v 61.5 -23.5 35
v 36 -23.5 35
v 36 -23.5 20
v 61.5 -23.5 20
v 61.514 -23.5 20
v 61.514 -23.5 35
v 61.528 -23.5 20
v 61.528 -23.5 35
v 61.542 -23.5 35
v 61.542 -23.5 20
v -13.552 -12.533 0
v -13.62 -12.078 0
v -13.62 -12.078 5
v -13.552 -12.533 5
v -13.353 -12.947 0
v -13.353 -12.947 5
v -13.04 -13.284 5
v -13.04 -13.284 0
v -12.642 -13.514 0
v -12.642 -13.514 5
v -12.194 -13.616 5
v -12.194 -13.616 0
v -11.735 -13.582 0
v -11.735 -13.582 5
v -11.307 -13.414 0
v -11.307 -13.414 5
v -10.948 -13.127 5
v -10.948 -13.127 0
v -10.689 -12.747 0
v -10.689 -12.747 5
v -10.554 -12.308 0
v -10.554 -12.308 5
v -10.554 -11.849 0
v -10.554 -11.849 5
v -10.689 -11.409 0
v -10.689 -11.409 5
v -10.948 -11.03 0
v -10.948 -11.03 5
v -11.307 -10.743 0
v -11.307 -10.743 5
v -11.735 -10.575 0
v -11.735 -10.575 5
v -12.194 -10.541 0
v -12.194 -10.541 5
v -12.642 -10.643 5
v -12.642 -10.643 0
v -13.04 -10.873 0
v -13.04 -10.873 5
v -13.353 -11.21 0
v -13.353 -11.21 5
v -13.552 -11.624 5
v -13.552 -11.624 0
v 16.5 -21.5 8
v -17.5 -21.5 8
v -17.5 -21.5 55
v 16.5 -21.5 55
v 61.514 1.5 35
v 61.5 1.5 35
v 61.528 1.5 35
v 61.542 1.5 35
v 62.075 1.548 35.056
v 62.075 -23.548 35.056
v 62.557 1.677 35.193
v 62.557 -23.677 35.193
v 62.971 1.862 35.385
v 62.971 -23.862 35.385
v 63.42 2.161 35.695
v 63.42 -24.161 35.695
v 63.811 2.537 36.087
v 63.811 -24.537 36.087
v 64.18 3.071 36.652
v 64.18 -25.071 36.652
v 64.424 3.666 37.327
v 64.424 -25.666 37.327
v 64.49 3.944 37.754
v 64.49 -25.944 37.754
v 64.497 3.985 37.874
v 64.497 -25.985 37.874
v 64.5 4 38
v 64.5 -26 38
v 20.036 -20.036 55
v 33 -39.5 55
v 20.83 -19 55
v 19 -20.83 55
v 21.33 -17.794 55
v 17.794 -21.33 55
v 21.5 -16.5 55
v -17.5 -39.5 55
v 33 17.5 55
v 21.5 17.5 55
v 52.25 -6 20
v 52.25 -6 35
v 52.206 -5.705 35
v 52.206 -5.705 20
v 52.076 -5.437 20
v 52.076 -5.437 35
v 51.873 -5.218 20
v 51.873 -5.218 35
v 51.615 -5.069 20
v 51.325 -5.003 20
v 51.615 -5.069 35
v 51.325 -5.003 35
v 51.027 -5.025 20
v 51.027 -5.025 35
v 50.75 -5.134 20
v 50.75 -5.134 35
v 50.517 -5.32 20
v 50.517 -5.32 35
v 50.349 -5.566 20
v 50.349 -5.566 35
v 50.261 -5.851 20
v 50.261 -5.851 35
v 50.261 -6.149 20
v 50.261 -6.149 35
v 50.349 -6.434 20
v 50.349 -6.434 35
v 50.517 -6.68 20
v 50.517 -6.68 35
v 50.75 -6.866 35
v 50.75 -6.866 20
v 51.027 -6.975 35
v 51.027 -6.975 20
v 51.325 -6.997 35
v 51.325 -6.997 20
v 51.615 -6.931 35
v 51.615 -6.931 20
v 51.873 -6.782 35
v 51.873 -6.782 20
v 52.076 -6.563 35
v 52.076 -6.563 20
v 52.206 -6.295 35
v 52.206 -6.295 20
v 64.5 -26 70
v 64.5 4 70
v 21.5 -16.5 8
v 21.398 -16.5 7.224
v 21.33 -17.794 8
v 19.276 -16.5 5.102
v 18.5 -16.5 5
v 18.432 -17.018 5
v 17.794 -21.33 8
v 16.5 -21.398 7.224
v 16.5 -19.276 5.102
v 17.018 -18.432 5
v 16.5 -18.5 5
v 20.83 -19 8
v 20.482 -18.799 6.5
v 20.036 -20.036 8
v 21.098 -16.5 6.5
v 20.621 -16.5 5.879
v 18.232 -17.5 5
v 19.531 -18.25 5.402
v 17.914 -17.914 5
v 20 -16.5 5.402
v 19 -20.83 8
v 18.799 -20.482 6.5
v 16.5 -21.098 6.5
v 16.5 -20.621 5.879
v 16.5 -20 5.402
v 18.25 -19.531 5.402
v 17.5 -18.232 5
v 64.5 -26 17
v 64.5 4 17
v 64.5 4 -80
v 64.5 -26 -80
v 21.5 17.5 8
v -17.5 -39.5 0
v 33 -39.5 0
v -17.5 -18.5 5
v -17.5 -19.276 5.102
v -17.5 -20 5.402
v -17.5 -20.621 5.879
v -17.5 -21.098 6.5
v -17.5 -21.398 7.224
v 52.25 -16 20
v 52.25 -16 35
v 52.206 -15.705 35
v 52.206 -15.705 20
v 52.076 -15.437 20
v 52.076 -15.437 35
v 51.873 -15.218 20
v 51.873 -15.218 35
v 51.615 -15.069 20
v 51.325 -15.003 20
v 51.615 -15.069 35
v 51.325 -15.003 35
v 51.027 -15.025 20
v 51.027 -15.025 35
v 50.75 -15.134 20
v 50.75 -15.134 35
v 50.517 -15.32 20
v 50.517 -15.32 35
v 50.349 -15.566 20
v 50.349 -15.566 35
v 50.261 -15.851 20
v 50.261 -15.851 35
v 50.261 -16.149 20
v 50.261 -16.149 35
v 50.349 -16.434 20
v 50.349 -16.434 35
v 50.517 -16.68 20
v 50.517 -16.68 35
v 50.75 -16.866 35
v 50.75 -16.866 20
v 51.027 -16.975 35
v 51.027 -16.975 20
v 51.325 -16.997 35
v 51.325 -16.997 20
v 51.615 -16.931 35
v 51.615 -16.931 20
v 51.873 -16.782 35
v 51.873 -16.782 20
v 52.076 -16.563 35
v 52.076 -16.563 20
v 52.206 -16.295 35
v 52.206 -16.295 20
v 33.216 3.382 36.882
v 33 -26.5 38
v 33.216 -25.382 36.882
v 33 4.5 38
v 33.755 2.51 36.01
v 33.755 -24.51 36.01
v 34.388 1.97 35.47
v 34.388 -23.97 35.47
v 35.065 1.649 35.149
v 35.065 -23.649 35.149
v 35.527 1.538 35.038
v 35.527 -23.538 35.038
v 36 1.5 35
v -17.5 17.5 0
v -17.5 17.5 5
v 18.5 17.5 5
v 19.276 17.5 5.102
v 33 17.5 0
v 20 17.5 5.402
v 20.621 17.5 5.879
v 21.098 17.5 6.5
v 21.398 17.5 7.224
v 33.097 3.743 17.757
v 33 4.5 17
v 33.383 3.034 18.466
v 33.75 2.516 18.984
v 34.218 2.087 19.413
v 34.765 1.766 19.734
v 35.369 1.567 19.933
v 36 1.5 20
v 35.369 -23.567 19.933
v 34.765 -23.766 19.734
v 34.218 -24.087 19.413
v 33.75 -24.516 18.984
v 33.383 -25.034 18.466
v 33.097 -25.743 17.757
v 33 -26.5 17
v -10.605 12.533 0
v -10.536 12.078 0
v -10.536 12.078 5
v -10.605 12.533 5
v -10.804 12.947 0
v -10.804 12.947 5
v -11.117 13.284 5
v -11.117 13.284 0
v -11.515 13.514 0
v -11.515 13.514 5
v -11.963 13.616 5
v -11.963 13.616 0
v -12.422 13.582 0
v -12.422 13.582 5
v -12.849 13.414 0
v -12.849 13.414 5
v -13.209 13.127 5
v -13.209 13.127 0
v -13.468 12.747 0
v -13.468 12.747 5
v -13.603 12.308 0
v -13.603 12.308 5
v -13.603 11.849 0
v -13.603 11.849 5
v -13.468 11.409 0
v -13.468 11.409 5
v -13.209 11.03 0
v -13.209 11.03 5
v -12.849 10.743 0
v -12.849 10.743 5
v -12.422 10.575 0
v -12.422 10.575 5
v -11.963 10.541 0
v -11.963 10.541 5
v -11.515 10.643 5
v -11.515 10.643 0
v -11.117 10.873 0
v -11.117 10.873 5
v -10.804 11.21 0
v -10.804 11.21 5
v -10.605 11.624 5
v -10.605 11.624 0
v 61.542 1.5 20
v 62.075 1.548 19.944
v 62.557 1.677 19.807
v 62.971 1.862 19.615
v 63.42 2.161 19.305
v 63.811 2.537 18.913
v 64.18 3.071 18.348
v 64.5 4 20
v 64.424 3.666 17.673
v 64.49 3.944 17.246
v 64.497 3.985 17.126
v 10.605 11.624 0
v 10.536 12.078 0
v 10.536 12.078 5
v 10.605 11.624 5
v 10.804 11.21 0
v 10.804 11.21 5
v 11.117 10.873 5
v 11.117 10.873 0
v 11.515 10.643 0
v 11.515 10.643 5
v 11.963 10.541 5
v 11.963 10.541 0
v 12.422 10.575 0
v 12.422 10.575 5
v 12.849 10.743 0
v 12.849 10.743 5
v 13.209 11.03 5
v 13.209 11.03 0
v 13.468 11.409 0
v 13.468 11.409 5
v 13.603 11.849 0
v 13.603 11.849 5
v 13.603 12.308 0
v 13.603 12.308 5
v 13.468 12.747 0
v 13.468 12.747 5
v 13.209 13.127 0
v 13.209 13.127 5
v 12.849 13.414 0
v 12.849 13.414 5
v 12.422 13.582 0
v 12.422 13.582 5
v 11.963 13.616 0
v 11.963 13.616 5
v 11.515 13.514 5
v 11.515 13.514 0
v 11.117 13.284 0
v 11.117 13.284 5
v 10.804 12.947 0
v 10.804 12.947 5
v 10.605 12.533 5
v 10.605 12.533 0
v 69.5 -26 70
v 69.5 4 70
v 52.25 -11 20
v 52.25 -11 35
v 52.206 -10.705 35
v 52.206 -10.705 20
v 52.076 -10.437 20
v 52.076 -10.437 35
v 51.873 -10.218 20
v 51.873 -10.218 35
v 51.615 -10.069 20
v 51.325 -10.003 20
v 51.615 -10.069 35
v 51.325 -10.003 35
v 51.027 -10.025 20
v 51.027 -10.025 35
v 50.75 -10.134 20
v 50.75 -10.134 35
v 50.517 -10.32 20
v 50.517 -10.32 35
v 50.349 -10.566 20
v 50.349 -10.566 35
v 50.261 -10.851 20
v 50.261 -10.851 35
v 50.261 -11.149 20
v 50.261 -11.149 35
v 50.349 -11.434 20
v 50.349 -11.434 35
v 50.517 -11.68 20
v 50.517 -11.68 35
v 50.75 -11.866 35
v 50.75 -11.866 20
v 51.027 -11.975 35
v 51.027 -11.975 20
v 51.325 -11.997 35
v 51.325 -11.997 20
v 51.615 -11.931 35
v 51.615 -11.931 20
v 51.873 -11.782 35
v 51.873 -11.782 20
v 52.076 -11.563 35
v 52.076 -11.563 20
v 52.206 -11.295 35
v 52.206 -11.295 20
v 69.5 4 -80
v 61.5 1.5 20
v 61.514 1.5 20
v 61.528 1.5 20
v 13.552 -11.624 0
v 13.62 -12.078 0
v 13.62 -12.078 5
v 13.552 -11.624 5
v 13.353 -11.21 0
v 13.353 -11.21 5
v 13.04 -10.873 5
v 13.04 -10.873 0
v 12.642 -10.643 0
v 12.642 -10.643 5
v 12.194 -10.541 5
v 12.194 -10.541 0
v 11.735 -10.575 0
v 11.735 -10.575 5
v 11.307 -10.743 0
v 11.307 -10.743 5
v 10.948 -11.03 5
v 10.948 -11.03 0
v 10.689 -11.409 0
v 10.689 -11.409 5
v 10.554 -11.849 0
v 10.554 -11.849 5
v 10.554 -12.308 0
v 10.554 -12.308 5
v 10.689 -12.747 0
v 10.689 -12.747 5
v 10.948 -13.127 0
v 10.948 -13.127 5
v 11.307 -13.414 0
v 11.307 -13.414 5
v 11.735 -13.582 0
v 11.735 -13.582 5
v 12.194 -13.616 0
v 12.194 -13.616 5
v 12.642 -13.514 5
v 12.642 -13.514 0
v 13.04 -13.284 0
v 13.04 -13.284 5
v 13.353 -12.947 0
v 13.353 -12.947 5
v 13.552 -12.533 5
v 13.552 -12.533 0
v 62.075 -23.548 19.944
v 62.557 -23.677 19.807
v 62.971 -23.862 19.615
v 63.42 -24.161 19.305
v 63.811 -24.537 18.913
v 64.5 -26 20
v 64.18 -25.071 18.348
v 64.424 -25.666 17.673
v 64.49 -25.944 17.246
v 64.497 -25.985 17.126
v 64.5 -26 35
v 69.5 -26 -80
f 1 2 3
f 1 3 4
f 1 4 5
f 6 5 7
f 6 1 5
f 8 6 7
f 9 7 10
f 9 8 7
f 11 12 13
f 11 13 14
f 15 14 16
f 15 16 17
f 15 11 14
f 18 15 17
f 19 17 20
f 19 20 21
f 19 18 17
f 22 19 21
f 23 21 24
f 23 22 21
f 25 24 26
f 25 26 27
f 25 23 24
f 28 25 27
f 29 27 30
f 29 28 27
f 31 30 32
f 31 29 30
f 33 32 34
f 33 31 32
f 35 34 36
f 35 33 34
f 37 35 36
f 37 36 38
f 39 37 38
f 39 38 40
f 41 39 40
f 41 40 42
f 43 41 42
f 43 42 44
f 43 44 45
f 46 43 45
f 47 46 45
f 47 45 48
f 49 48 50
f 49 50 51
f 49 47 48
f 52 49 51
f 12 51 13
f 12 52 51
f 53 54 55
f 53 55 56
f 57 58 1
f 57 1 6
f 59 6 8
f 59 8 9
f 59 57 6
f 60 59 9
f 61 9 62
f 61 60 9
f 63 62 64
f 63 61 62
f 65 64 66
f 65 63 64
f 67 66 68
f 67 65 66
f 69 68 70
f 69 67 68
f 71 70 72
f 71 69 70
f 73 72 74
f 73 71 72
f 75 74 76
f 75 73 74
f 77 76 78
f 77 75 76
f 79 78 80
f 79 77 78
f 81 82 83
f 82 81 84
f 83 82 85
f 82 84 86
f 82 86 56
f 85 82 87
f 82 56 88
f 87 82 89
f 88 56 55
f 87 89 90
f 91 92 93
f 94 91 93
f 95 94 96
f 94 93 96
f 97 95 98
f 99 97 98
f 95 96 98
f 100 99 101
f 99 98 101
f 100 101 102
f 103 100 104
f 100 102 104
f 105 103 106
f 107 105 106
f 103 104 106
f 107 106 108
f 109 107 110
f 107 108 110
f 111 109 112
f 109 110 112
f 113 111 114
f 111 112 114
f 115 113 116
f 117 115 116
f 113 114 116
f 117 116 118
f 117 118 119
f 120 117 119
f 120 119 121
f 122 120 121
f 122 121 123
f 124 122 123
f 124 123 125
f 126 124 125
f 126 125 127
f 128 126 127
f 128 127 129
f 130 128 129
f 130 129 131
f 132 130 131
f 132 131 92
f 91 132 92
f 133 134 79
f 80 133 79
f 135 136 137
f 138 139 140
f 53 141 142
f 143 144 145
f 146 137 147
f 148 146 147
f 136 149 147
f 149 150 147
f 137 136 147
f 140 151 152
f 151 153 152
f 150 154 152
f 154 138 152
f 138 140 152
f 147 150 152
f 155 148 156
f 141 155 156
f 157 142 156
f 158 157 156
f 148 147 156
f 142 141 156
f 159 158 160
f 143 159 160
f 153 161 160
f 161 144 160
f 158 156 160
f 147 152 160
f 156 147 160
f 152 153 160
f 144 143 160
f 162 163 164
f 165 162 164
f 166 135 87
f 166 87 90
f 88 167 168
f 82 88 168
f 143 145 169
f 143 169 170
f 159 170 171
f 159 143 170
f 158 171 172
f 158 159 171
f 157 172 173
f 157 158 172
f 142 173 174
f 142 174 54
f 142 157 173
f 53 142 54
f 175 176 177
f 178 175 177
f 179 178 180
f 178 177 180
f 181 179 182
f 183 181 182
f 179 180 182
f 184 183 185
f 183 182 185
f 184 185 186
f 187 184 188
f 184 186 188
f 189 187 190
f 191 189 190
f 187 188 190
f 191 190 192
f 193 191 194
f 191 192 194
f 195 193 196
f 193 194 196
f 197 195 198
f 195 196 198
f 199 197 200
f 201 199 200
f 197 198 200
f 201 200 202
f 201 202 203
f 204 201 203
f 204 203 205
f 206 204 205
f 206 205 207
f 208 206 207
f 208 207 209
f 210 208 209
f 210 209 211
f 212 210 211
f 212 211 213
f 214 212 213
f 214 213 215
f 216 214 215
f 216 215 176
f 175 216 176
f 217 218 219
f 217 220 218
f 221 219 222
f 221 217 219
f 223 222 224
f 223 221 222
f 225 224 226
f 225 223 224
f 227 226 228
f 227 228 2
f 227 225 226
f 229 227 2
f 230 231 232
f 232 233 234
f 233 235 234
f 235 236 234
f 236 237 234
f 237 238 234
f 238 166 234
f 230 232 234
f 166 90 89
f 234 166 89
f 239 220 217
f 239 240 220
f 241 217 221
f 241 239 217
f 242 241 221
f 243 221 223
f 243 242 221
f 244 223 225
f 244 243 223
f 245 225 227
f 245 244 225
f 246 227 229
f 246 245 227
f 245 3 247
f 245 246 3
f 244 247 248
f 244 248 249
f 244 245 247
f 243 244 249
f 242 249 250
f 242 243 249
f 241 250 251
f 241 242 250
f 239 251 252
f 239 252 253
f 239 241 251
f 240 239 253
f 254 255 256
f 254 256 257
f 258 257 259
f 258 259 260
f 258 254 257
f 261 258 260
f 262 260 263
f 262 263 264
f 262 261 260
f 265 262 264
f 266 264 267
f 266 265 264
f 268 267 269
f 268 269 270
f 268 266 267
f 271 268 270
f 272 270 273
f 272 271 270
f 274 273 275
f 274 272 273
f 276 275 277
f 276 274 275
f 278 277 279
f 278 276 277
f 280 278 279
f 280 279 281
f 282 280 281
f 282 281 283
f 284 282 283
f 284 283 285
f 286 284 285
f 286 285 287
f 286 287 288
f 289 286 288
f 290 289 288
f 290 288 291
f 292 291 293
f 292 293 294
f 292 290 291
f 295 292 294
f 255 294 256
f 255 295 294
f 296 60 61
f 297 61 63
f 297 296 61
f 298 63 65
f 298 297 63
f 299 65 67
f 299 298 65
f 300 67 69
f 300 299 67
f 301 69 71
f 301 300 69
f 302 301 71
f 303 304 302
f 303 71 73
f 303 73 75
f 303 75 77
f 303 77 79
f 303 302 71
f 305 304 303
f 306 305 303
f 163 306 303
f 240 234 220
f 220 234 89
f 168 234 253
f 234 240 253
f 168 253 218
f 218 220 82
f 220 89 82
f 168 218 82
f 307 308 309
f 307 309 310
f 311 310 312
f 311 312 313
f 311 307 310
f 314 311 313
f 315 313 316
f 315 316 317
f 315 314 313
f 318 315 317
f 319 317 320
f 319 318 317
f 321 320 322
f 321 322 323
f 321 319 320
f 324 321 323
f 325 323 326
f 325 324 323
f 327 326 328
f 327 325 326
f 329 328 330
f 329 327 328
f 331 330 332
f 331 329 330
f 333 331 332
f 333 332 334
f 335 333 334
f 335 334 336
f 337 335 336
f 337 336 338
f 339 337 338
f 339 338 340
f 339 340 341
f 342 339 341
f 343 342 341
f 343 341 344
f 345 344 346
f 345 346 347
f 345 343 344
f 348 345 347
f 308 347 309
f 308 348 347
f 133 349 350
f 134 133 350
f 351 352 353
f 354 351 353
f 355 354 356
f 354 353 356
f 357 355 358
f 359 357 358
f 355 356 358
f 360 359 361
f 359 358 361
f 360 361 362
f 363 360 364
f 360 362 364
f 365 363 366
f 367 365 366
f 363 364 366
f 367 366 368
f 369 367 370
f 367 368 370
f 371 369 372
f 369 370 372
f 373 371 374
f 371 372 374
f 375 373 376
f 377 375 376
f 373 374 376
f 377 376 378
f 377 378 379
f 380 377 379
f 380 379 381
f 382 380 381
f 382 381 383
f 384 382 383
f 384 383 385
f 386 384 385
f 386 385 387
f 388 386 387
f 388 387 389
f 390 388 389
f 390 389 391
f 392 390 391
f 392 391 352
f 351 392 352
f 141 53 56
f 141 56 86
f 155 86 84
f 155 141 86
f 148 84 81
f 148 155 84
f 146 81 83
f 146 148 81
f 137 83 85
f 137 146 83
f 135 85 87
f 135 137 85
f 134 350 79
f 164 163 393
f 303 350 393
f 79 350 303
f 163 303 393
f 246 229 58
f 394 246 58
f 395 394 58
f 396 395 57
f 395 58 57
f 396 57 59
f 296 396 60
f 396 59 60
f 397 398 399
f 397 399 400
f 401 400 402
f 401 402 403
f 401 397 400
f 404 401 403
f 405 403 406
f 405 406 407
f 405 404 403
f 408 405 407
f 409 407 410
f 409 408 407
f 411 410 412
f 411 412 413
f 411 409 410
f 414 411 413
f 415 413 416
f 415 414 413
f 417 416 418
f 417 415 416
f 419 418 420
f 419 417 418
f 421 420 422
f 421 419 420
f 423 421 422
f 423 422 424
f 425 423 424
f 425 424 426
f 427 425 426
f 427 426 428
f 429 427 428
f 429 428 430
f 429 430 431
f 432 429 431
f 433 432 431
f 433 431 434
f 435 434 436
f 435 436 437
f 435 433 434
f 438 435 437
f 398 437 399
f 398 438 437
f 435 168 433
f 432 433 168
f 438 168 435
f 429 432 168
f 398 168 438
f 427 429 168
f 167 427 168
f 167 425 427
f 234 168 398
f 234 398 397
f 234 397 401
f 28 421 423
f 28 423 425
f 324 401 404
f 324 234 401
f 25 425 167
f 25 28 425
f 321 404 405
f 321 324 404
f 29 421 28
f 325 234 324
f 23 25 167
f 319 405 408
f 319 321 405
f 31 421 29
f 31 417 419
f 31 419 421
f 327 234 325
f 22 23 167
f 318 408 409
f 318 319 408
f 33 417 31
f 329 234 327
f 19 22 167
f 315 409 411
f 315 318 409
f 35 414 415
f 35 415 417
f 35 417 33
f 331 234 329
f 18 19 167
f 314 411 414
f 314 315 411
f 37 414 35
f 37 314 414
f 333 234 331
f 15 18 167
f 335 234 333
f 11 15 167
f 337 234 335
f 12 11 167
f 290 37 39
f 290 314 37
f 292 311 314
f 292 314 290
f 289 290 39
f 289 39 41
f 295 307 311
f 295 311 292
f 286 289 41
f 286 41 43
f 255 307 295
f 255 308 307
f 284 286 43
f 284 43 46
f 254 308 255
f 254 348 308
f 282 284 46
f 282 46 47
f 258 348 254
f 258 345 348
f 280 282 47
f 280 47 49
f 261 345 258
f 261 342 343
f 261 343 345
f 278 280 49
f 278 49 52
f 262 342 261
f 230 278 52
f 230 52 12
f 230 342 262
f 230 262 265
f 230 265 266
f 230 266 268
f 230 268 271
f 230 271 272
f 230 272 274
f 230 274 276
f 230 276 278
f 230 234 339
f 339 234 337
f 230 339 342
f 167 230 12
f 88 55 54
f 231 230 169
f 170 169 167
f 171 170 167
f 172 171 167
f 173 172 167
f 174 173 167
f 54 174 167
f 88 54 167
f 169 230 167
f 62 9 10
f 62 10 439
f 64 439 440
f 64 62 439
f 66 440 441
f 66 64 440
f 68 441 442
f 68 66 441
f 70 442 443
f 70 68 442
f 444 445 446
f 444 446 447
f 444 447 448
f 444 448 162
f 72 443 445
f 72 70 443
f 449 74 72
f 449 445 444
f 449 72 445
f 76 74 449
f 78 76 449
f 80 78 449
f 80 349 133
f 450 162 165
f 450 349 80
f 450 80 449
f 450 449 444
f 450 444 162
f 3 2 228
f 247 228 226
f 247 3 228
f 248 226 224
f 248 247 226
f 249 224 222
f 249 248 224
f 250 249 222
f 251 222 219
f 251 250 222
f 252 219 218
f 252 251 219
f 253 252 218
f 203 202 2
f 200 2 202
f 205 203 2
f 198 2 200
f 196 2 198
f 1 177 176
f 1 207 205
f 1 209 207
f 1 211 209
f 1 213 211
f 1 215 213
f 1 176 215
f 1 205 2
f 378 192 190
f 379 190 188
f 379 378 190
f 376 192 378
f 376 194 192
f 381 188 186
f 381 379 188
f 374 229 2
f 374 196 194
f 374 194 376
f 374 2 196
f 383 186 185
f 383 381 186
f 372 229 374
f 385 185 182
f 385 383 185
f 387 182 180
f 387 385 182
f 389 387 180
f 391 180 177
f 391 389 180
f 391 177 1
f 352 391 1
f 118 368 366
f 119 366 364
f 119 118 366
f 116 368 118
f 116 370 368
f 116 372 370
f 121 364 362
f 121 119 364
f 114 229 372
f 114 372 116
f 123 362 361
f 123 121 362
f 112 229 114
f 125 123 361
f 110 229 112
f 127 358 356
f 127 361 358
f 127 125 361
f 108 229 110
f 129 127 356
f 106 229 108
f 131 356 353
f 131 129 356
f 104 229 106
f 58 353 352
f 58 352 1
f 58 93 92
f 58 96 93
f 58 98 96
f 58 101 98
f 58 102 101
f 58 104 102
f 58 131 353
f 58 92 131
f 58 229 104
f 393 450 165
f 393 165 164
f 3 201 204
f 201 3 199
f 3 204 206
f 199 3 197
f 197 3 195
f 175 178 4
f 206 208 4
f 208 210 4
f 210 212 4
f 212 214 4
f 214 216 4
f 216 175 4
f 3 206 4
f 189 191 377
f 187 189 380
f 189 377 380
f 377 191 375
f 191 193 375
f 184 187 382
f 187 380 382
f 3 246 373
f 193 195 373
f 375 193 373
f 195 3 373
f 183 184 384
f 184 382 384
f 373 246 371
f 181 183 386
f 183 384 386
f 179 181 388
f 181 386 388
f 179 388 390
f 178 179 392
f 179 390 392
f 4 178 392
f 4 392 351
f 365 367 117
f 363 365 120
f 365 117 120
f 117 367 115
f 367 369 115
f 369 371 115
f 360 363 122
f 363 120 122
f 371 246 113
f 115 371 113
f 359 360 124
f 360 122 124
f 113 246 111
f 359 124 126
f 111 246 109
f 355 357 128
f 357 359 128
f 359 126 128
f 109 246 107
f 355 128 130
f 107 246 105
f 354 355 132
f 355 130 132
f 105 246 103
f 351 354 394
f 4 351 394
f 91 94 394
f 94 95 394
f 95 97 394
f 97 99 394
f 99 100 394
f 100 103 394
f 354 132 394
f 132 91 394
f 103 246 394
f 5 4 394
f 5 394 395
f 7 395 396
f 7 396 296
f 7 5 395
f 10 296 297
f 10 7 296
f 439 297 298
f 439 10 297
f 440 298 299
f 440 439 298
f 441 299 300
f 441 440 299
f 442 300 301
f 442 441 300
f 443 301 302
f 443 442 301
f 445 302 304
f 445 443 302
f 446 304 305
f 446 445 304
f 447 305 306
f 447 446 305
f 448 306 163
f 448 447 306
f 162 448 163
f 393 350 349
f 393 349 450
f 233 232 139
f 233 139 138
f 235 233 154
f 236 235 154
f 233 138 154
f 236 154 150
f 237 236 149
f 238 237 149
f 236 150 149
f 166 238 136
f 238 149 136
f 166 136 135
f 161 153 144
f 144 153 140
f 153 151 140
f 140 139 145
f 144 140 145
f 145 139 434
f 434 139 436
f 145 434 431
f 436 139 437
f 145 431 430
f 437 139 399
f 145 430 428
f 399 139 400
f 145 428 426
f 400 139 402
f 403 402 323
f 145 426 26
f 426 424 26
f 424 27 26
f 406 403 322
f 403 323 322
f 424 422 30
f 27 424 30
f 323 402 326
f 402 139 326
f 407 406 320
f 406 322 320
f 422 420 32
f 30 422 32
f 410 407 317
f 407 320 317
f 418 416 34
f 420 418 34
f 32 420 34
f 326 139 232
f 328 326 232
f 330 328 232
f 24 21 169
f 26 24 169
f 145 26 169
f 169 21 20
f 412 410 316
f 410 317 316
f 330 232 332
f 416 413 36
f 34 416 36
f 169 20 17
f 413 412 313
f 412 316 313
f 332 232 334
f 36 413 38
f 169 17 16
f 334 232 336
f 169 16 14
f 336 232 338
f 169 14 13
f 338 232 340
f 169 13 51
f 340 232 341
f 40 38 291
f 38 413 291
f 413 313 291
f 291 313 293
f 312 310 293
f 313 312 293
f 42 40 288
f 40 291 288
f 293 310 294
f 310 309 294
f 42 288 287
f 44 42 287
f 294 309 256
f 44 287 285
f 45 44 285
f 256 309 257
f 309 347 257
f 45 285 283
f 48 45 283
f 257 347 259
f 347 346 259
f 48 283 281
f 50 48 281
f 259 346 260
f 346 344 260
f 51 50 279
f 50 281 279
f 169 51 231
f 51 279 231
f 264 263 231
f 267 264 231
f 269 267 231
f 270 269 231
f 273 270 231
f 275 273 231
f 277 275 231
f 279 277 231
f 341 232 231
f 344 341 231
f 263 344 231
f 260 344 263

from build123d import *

# Parameters (mm, degrees)
SKETCH1_R                = 1.542
BOSS_EXTRUDE1_DEPTH      = 5
BOSS_EXTRUDE4_DEPTH      = 50
BOSS_EXTRUDE4_DEPTH_BACK = 5
FILLET3_R                = 3
FILLET4_R                = 5
BOSS_EXTRUDE5_DEPTH      = 55
SKETCH7_W                = 15
SKETCH7_H                = 25
BOSS_EXTRUDE6_DEPTH      = 36.5
SKETCH8_R                = 1
CUT_EXTRUDE1_DEPTH       = 88.266832187
SKETCH9_W                = 150
SKETCH9_H                = 30
BOSS_EXTRUDE7_DEPTH      = 5
FILLET5_R                = 3
FILLET6_R                = 3


with BuildPart() as part:
    # Sketch1 → Boss-Extrude1 (new body)
    with BuildSketch(Plane.XY):
        Polygon((-17.5, 17.5), (17.5, 17.5), (21.5, 17.5), (21.5, -21.5), (17.5, -21.5), (-17.5, -21.5), (-17.5, -17.5), align=None)
        with Locations((-12.078444483, 12.078444483)):
            Circle(SKETCH1_R, mode=Mode.SUBTRACT)
        with Locations(Location((12.078444483, 12.078444483, 0), (0, 0, 180))):
            Circle(SKETCH1_R, mode=Mode.SUBTRACT)
        with Locations((12.078444483, -12.078444483)):
            Circle(SKETCH1_R, mode=Mode.SUBTRACT)
        with Locations(Location((-12.078444483, -12.078444483, 0), (0, 0, 180))):
            Circle(SKETCH1_R, mode=Mode.SUBTRACT)
    extrude(amount=BOSS_EXTRUDE1_DEPTH)

    # Sketch4 → Boss-Extrude4 (add, two sides: drawn at the far end of the back side and taken through both)
    with BuildSketch(Plane.XY.offset(5).offset(-BOSS_EXTRUDE4_DEPTH_BACK)):
        Polygon((21.5, 17.5), (26, 17.5), (26, -26), (-17.5, -26), (-17.5, -21.5), (21.5, -21.5), align=None)
    extrude(amount=BOSS_EXTRUDE4_DEPTH + BOSS_EXTRUDE4_DEPTH_BACK)

    # Fillet3
    fillet3_edges = [part.edges().sort_by_distance(p)[0] for p in [
        (2, -21.5, 5),
        (21.5, -2, 5),
    ]]
    fillet(fillet3_edges, radius=FILLET3_R)

    # Fillet4
    # the kernel refuses this fillet: 5 mm, written as the material it adds along each edge
    with BuildSketch(Plane(origin=(16.5, -16.5, 5), x_dir=(1, 0, 0), z_dir=(0, 1, 0))) as fillet4_piece_1:
        with BuildLine():
            CenterArc((2, -3), 3, 0, 90)
            Line((5, -3), (5, 0))
            Line((5, 0), (2, 0))
        make_face()
    revolve(axis=Axis((16.5, -16.5, 5), (0, 0, -1)), revolution_arc=90)
    with BuildSketch(Plane(origin=(21.5, -21.5, 5), x_dir=(0, 1, 0), z_dir=(0, 0, 1))) as fillet4_piece_2:
        with BuildLine():
            CenterArc((FILLET4_R, FILLET4_R), FILLET4_R, 180, 90)
            Line((0, FILLET4_R), (0, 0))
            Line((0, 0), (FILLET4_R, 0))
        make_face()
    extrude(amount=50)

    # Sketch6 → Boss-Extrude5 (add, through all)
    with BuildSketch(Plane.XY.offset(55)):
        Polygon((-17.5, -26), (26, -26), (26, 17.5), (33, 17.5), (33, -39.5), (26, -39.5), (-17.5, -39.5), align=None)
    extrude(amount=-BOSS_EXTRUDE5_DEPTH)

    # Sketch7 → Boss-Extrude6 (add)
    with BuildSketch(Plane(origin=(33, 0, 0), x_dir=(0, 0, -1), z_dir=(1, 0, 0))):
        with Locations((-27.5, -11)):
            Rectangle(SKETCH7_W, SKETCH7_H)
    extrude(amount=BOSS_EXTRUDE6_DEPTH)

    # Sketch8 → Cut-Extrude1 (cut, through all)
    with BuildSketch(Plane.XY.offset(35)):
        with Locations((51.25, -11)):
            Circle(SKETCH8_R)
        with Locations((51.25, -16)):
            Circle(SKETCH8_R)
        with Locations((51.25, -6)):
            Circle(SKETCH8_R)
    extrude(amount=-CUT_EXTRUDE1_DEPTH, mode=Mode.SUBTRACT)

    # Sketch9 → Boss-Extrude7 (add)
    with BuildSketch(Plane(origin=(69.5, 0, 0), x_dir=(0, 0, -1), z_dir=(1, 0, 0))):
        with Locations((5, -11)):
            Rectangle(SKETCH9_W, SKETCH9_H)
    extrude(amount=-BOSS_EXTRUDE7_DEPTH)

    # Fillet5
    # the kernel refuses this fillet: 3 mm, written as the material it adds along each edge
    with BuildSketch(Plane(origin=(64.5, -23.5, 35), x_dir=(-1, 0, 0), z_dir=(0, 0, -1)), Plane(origin=(64.5, 1.5, 20), x_dir=(-1, 0, 0), z_dir=(0, 0, 1))) as fillet5_piece_1:
        with BuildLine():
            CenterArc((2.958039892, -3), FILLET5_R, 90, 80.405931773)
            Line((0, -2.5), (-0.059160798, -2.49))
            ThreePointArc((-0.059160798, -2.49), (-0.06, -1.25), (-0.06, 0))
            Line((-0.06, 0), (0, 0.06))
            Line((0, 0.06), (2.958039892, 0.06))
            Line((2.958039892, 0.06), (2.958039892, 0))
        make_face()
    extrude(amount=15)
    with BuildSketch(Plane(origin=(64.5, -23.5, 20), x_dir=(-1, 0, 0), z_dir=(0, 1, 0)), Plane(origin=(64.5, 1.5, 35), x_dir=(-1, 0, 0), z_dir=(0, -1, 0))) as fillet5_piece_2:
        with BuildLine():
            CenterArc((FILLET5_R, -FILLET5_R), FILLET5_R, 90, 90)
            Line((0, -FILLET5_R), (-FILLET5_R * 0.02, -FILLET5_R))
            Line((-FILLET5_R * 0.02, -FILLET5_R), (-FILLET5_R * 0.02, FILLET5_R * 0.02))
            Line((-FILLET5_R * 0.02, FILLET5_R * 0.02), (FILLET5_R, FILLET5_R * 0.02))
            Line((FILLET5_R, FILLET5_R * 0.02), (FILLET5_R, 0))
        make_face()
    extrude(amount=25)
    with BuildSketch(Plane(origin=(64.5, -23.5, 42.395099729), x_dir=(-1, 0, 0), z_dir=(0, 0, -1))) as fillet5_piece_3a_section:
        with BuildLine():
            CenterArc((2.958039892, -3), FILLET5_R, 90, 80.405931773)
            Line((0, -2.5), (-0.059160798, -2.49))
            ThreePointArc((-0.059160798, -2.49), (-0.06, -1.25), (-0.06, 0))
            Line((-0.06, 0), (0, 0.06))
            Line((0, 0.06), (2.958039892, 0.06))
            Line((2.958039892, 0.06), (2.958039892, 0))
        make_face()
    fillet5_piece_3a = extrude(amount=22.395099729, mode=Mode.PRIVATE)
    fillet5_piece_3a = split(fillet5_piece_3a, bisect_by=Plane(origin=(63.81401797, -24.116958935, 35), z_dir=(0, 0, 1)), keep=Keep.TOP, mode=Mode.PRIVATE)
    with BuildSketch(Plane(origin=(64.5, 1.5, 35), x_dir=(-1, 0, 0), z_dir=(0, -1, 0))) as fillet5_piece_3b_section:
        with BuildLine():
            CenterArc((FILLET5_R, -FILLET5_R), FILLET5_R, 90, 90)
            Line((0, -FILLET5_R), (-FILLET5_R * 0.02, -FILLET5_R))
            Line((-FILLET5_R * 0.02, -FILLET5_R), (-FILLET5_R * 0.02, FILLET5_R * 0.02))
            Line((-FILLET5_R * 0.02, FILLET5_R * 0.02), (FILLET5_R, FILLET5_R * 0.02))
            Line((FILLET5_R, FILLET5_R * 0.02), (FILLET5_R, 0))
        make_face()
    fillet5_piece_3b = extrude(amount=32.5, mode=Mode.PRIVATE)
    fillet5_piece_3b = split(fillet5_piece_3b, bisect_by=Plane(origin=(63.820814657, -23.5, 35.679185343), z_dir=(0, -1, 0)), keep=Keep.TOP, mode=Mode.PRIVATE)
    fillet5_piece_3b = split(fillet5_piece_3b, bisect_by=Plane(origin=(63.820814657, -26, 35.679185343), z_dir=(0, 1, 0)), keep=Keep.TOP, mode=Mode.PRIVATE)
    fillet5_piece_3 = fillet5_piece_3a & fillet5_piece_3b
    add(fillet5_piece_3)
    with BuildSketch(Plane(origin=(64.5, -31, 20), x_dir=(-1, 0, 0), z_dir=(0, 1, 0))) as fillet5_piece_4a_section:
        with BuildLine():
            CenterArc((FILLET5_R, -FILLET5_R), FILLET5_R, 90, 90)
            Line((0, -FILLET5_R), (-FILLET5_R * 0.02, -FILLET5_R))
            Line((-FILLET5_R * 0.02, -FILLET5_R), (-FILLET5_R * 0.02, FILLET5_R * 0.02))
            Line((-FILLET5_R * 0.02, FILLET5_R * 0.02), (FILLET5_R, FILLET5_R * 0.02))
            Line((FILLET5_R, FILLET5_R * 0.02), (FILLET5_R, 0))
        make_face()
    fillet5_piece_4a = extrude(amount=32.5, mode=Mode.PRIVATE)
    fillet5_piece_4a = split(fillet5_piece_4a, bisect_by=Plane(origin=(63.820814657, -23.5, 19.320814657), z_dir=(0, -1, 0)), keep=Keep.TOP, mode=Mode.PRIVATE)
    fillet5_piece_4a = split(fillet5_piece_4a, bisect_by=Plane(origin=(63.820814657, -26, 19.320814657), z_dir=(0, 1, 0)), keep=Keep.TOP, mode=Mode.PRIVATE)
    with BuildSketch(Plane(origin=(64.5, -23.5, 35), x_dir=(-1, 0, 0), z_dir=(0, 0, -1))) as fillet5_piece_4b_section:
        with BuildLine():
            CenterArc((2.958039892, -3), FILLET5_R, 90, 80.405931773)
            Line((0, -2.5), (-0.059160798, -2.49))
            ThreePointArc((-0.059160798, -2.49), (-0.06, -1.25), (-0.06, 0))
            Line((-0.06, 0), (0, 0.06))
            Line((0, 0.06), (2.958039892, 0.06))
            Line((2.958039892, 0.06), (2.958039892, 0))
        make_face()
    fillet5_piece_4b = extrude(amount=22.395099729, mode=Mode.PRIVATE)
    fillet5_piece_4b = split(fillet5_piece_4b, bisect_by=Plane(origin=(63.81401797, -24.116958935, 20), z_dir=(0, 0, -1)), keep=Keep.TOP, mode=Mode.PRIVATE)
    fillet5_piece_4 = fillet5_piece_4a & fillet5_piece_4b
    add(fillet5_piece_4)
    with BuildSketch(Plane(origin=(64.5, 1.5, 12.604900271), x_dir=(-1, 0, 0), z_dir=(0, 0, 1))) as fillet5_piece_5a_section:
        with BuildLine():
            CenterArc((2.958039892, -3), FILLET5_R, 90, 80.405931773)
            Line((0, -2.5), (-0.059160798, -2.49))
            ThreePointArc((-0.059160798, -2.49), (-0.06, -1.25), (-0.06, 0))
            Line((-0.06, 0), (0, 0.06))
            Line((0, 0.06), (2.958039892, 0.06))
            Line((2.958039892, 0.06), (2.958039892, 0))
        make_face()
    fillet5_piece_5a = extrude(amount=22.395099729, mode=Mode.PRIVATE)
    fillet5_piece_5a = split(fillet5_piece_5a, bisect_by=Plane(origin=(63.81401797, 2.116958935, 20), z_dir=(0, 0, -1)), keep=Keep.TOP, mode=Mode.PRIVATE)
    with BuildSketch(Plane(origin=(64.5, -23.5, 20), x_dir=(-1, 0, 0), z_dir=(0, 1, 0))) as fillet5_piece_5b_section:
        with BuildLine():
            CenterArc((FILLET5_R, -FILLET5_R), FILLET5_R, 90, 90)
            Line((0, -FILLET5_R), (-FILLET5_R * 0.02, -FILLET5_R))
            Line((-FILLET5_R * 0.02, -FILLET5_R), (-FILLET5_R * 0.02, FILLET5_R * 0.02))
            Line((-FILLET5_R * 0.02, FILLET5_R * 0.02), (FILLET5_R, FILLET5_R * 0.02))
            Line((FILLET5_R, FILLET5_R * 0.02), (FILLET5_R, 0))
        make_face()
    fillet5_piece_5b = extrude(amount=32.5, mode=Mode.PRIVATE)
    fillet5_piece_5b = split(fillet5_piece_5b, bisect_by=Plane(origin=(63.820814657, 1.5, 19.320814657), z_dir=(0, 1, 0)), keep=Keep.TOP, mode=Mode.PRIVATE)
    fillet5_piece_5b = split(fillet5_piece_5b, bisect_by=Plane(origin=(63.820814657, 4, 19.320814657), z_dir=(0, -1, 0)), keep=Keep.TOP, mode=Mode.PRIVATE)
    fillet5_piece_5 = fillet5_piece_5a & fillet5_piece_5b
    add(fillet5_piece_5)
    with BuildSketch(Plane(origin=(64.5, 1.5, 20), x_dir=(-1, 0, 0), z_dir=(0, 0, 1))) as fillet5_piece_6a_section:
        with BuildLine():
            CenterArc((2.958039892, -3), FILLET5_R, 90, 80.405931773)
            Line((0, -2.5), (-0.059160798, -2.49))
            ThreePointArc((-0.059160798, -2.49), (-0.06, -1.25), (-0.06, 0))
            Line((-0.06, 0), (0, 0.06))
            Line((0, 0.06), (2.958039892, 0.06))
            Line((2.958039892, 0.06), (2.958039892, 0))
        make_face()
    fillet5_piece_6a = extrude(amount=22.395099729, mode=Mode.PRIVATE)
    fillet5_piece_6a = split(fillet5_piece_6a, bisect_by=Plane(origin=(63.81401797, 2.116958935, 35), z_dir=(0, 0, 1)), keep=Keep.TOP, mode=Mode.PRIVATE)
    with BuildSketch(Plane(origin=(64.5, 9, 35), x_dir=(-1, 0, 0), z_dir=(0, -1, 0))) as fillet5_piece_6b_section:
        with BuildLine():
            CenterArc((FILLET5_R, -FILLET5_R), FILLET5_R, 90, 90)
            Line((0, -FILLET5_R), (-FILLET5_R * 0.02, -FILLET5_R))
            Line((-FILLET5_R * 0.02, -FILLET5_R), (-FILLET5_R * 0.02, FILLET5_R * 0.02))
            Line((-FILLET5_R * 0.02, FILLET5_R * 0.02), (FILLET5_R, FILLET5_R * 0.02))
            Line((FILLET5_R, FILLET5_R * 0.02), (FILLET5_R, 0))
        make_face()
    fillet5_piece_6b = extrude(amount=32.5, mode=Mode.PRIVATE)
    fillet5_piece_6b = split(fillet5_piece_6b, bisect_by=Plane(origin=(63.820814657, 1.5, 35.679185343), z_dir=(0, 1, 0)), keep=Keep.TOP, mode=Mode.PRIVATE)
    fillet5_piece_6b = split(fillet5_piece_6b, bisect_by=Plane(origin=(63.820814657, 4, 35.679185343), z_dir=(0, -1, 0)), keep=Keep.TOP, mode=Mode.PRIVATE)
    fillet5_piece_6 = fillet5_piece_6a & fillet5_piece_6b
    add(fillet5_piece_6)

    # Fillet6
    fillet6_edges = [part.edges().sort_by_distance(p)[0] for p in [
        (33, -11, 20),
        (33, 1.5, 27.5),
        (33, -11, 35),
        (33, -23.5, 27.5),
    ]]
    fillet(fillet6_edges, radius=FILLET6_R)


solid = part.part
